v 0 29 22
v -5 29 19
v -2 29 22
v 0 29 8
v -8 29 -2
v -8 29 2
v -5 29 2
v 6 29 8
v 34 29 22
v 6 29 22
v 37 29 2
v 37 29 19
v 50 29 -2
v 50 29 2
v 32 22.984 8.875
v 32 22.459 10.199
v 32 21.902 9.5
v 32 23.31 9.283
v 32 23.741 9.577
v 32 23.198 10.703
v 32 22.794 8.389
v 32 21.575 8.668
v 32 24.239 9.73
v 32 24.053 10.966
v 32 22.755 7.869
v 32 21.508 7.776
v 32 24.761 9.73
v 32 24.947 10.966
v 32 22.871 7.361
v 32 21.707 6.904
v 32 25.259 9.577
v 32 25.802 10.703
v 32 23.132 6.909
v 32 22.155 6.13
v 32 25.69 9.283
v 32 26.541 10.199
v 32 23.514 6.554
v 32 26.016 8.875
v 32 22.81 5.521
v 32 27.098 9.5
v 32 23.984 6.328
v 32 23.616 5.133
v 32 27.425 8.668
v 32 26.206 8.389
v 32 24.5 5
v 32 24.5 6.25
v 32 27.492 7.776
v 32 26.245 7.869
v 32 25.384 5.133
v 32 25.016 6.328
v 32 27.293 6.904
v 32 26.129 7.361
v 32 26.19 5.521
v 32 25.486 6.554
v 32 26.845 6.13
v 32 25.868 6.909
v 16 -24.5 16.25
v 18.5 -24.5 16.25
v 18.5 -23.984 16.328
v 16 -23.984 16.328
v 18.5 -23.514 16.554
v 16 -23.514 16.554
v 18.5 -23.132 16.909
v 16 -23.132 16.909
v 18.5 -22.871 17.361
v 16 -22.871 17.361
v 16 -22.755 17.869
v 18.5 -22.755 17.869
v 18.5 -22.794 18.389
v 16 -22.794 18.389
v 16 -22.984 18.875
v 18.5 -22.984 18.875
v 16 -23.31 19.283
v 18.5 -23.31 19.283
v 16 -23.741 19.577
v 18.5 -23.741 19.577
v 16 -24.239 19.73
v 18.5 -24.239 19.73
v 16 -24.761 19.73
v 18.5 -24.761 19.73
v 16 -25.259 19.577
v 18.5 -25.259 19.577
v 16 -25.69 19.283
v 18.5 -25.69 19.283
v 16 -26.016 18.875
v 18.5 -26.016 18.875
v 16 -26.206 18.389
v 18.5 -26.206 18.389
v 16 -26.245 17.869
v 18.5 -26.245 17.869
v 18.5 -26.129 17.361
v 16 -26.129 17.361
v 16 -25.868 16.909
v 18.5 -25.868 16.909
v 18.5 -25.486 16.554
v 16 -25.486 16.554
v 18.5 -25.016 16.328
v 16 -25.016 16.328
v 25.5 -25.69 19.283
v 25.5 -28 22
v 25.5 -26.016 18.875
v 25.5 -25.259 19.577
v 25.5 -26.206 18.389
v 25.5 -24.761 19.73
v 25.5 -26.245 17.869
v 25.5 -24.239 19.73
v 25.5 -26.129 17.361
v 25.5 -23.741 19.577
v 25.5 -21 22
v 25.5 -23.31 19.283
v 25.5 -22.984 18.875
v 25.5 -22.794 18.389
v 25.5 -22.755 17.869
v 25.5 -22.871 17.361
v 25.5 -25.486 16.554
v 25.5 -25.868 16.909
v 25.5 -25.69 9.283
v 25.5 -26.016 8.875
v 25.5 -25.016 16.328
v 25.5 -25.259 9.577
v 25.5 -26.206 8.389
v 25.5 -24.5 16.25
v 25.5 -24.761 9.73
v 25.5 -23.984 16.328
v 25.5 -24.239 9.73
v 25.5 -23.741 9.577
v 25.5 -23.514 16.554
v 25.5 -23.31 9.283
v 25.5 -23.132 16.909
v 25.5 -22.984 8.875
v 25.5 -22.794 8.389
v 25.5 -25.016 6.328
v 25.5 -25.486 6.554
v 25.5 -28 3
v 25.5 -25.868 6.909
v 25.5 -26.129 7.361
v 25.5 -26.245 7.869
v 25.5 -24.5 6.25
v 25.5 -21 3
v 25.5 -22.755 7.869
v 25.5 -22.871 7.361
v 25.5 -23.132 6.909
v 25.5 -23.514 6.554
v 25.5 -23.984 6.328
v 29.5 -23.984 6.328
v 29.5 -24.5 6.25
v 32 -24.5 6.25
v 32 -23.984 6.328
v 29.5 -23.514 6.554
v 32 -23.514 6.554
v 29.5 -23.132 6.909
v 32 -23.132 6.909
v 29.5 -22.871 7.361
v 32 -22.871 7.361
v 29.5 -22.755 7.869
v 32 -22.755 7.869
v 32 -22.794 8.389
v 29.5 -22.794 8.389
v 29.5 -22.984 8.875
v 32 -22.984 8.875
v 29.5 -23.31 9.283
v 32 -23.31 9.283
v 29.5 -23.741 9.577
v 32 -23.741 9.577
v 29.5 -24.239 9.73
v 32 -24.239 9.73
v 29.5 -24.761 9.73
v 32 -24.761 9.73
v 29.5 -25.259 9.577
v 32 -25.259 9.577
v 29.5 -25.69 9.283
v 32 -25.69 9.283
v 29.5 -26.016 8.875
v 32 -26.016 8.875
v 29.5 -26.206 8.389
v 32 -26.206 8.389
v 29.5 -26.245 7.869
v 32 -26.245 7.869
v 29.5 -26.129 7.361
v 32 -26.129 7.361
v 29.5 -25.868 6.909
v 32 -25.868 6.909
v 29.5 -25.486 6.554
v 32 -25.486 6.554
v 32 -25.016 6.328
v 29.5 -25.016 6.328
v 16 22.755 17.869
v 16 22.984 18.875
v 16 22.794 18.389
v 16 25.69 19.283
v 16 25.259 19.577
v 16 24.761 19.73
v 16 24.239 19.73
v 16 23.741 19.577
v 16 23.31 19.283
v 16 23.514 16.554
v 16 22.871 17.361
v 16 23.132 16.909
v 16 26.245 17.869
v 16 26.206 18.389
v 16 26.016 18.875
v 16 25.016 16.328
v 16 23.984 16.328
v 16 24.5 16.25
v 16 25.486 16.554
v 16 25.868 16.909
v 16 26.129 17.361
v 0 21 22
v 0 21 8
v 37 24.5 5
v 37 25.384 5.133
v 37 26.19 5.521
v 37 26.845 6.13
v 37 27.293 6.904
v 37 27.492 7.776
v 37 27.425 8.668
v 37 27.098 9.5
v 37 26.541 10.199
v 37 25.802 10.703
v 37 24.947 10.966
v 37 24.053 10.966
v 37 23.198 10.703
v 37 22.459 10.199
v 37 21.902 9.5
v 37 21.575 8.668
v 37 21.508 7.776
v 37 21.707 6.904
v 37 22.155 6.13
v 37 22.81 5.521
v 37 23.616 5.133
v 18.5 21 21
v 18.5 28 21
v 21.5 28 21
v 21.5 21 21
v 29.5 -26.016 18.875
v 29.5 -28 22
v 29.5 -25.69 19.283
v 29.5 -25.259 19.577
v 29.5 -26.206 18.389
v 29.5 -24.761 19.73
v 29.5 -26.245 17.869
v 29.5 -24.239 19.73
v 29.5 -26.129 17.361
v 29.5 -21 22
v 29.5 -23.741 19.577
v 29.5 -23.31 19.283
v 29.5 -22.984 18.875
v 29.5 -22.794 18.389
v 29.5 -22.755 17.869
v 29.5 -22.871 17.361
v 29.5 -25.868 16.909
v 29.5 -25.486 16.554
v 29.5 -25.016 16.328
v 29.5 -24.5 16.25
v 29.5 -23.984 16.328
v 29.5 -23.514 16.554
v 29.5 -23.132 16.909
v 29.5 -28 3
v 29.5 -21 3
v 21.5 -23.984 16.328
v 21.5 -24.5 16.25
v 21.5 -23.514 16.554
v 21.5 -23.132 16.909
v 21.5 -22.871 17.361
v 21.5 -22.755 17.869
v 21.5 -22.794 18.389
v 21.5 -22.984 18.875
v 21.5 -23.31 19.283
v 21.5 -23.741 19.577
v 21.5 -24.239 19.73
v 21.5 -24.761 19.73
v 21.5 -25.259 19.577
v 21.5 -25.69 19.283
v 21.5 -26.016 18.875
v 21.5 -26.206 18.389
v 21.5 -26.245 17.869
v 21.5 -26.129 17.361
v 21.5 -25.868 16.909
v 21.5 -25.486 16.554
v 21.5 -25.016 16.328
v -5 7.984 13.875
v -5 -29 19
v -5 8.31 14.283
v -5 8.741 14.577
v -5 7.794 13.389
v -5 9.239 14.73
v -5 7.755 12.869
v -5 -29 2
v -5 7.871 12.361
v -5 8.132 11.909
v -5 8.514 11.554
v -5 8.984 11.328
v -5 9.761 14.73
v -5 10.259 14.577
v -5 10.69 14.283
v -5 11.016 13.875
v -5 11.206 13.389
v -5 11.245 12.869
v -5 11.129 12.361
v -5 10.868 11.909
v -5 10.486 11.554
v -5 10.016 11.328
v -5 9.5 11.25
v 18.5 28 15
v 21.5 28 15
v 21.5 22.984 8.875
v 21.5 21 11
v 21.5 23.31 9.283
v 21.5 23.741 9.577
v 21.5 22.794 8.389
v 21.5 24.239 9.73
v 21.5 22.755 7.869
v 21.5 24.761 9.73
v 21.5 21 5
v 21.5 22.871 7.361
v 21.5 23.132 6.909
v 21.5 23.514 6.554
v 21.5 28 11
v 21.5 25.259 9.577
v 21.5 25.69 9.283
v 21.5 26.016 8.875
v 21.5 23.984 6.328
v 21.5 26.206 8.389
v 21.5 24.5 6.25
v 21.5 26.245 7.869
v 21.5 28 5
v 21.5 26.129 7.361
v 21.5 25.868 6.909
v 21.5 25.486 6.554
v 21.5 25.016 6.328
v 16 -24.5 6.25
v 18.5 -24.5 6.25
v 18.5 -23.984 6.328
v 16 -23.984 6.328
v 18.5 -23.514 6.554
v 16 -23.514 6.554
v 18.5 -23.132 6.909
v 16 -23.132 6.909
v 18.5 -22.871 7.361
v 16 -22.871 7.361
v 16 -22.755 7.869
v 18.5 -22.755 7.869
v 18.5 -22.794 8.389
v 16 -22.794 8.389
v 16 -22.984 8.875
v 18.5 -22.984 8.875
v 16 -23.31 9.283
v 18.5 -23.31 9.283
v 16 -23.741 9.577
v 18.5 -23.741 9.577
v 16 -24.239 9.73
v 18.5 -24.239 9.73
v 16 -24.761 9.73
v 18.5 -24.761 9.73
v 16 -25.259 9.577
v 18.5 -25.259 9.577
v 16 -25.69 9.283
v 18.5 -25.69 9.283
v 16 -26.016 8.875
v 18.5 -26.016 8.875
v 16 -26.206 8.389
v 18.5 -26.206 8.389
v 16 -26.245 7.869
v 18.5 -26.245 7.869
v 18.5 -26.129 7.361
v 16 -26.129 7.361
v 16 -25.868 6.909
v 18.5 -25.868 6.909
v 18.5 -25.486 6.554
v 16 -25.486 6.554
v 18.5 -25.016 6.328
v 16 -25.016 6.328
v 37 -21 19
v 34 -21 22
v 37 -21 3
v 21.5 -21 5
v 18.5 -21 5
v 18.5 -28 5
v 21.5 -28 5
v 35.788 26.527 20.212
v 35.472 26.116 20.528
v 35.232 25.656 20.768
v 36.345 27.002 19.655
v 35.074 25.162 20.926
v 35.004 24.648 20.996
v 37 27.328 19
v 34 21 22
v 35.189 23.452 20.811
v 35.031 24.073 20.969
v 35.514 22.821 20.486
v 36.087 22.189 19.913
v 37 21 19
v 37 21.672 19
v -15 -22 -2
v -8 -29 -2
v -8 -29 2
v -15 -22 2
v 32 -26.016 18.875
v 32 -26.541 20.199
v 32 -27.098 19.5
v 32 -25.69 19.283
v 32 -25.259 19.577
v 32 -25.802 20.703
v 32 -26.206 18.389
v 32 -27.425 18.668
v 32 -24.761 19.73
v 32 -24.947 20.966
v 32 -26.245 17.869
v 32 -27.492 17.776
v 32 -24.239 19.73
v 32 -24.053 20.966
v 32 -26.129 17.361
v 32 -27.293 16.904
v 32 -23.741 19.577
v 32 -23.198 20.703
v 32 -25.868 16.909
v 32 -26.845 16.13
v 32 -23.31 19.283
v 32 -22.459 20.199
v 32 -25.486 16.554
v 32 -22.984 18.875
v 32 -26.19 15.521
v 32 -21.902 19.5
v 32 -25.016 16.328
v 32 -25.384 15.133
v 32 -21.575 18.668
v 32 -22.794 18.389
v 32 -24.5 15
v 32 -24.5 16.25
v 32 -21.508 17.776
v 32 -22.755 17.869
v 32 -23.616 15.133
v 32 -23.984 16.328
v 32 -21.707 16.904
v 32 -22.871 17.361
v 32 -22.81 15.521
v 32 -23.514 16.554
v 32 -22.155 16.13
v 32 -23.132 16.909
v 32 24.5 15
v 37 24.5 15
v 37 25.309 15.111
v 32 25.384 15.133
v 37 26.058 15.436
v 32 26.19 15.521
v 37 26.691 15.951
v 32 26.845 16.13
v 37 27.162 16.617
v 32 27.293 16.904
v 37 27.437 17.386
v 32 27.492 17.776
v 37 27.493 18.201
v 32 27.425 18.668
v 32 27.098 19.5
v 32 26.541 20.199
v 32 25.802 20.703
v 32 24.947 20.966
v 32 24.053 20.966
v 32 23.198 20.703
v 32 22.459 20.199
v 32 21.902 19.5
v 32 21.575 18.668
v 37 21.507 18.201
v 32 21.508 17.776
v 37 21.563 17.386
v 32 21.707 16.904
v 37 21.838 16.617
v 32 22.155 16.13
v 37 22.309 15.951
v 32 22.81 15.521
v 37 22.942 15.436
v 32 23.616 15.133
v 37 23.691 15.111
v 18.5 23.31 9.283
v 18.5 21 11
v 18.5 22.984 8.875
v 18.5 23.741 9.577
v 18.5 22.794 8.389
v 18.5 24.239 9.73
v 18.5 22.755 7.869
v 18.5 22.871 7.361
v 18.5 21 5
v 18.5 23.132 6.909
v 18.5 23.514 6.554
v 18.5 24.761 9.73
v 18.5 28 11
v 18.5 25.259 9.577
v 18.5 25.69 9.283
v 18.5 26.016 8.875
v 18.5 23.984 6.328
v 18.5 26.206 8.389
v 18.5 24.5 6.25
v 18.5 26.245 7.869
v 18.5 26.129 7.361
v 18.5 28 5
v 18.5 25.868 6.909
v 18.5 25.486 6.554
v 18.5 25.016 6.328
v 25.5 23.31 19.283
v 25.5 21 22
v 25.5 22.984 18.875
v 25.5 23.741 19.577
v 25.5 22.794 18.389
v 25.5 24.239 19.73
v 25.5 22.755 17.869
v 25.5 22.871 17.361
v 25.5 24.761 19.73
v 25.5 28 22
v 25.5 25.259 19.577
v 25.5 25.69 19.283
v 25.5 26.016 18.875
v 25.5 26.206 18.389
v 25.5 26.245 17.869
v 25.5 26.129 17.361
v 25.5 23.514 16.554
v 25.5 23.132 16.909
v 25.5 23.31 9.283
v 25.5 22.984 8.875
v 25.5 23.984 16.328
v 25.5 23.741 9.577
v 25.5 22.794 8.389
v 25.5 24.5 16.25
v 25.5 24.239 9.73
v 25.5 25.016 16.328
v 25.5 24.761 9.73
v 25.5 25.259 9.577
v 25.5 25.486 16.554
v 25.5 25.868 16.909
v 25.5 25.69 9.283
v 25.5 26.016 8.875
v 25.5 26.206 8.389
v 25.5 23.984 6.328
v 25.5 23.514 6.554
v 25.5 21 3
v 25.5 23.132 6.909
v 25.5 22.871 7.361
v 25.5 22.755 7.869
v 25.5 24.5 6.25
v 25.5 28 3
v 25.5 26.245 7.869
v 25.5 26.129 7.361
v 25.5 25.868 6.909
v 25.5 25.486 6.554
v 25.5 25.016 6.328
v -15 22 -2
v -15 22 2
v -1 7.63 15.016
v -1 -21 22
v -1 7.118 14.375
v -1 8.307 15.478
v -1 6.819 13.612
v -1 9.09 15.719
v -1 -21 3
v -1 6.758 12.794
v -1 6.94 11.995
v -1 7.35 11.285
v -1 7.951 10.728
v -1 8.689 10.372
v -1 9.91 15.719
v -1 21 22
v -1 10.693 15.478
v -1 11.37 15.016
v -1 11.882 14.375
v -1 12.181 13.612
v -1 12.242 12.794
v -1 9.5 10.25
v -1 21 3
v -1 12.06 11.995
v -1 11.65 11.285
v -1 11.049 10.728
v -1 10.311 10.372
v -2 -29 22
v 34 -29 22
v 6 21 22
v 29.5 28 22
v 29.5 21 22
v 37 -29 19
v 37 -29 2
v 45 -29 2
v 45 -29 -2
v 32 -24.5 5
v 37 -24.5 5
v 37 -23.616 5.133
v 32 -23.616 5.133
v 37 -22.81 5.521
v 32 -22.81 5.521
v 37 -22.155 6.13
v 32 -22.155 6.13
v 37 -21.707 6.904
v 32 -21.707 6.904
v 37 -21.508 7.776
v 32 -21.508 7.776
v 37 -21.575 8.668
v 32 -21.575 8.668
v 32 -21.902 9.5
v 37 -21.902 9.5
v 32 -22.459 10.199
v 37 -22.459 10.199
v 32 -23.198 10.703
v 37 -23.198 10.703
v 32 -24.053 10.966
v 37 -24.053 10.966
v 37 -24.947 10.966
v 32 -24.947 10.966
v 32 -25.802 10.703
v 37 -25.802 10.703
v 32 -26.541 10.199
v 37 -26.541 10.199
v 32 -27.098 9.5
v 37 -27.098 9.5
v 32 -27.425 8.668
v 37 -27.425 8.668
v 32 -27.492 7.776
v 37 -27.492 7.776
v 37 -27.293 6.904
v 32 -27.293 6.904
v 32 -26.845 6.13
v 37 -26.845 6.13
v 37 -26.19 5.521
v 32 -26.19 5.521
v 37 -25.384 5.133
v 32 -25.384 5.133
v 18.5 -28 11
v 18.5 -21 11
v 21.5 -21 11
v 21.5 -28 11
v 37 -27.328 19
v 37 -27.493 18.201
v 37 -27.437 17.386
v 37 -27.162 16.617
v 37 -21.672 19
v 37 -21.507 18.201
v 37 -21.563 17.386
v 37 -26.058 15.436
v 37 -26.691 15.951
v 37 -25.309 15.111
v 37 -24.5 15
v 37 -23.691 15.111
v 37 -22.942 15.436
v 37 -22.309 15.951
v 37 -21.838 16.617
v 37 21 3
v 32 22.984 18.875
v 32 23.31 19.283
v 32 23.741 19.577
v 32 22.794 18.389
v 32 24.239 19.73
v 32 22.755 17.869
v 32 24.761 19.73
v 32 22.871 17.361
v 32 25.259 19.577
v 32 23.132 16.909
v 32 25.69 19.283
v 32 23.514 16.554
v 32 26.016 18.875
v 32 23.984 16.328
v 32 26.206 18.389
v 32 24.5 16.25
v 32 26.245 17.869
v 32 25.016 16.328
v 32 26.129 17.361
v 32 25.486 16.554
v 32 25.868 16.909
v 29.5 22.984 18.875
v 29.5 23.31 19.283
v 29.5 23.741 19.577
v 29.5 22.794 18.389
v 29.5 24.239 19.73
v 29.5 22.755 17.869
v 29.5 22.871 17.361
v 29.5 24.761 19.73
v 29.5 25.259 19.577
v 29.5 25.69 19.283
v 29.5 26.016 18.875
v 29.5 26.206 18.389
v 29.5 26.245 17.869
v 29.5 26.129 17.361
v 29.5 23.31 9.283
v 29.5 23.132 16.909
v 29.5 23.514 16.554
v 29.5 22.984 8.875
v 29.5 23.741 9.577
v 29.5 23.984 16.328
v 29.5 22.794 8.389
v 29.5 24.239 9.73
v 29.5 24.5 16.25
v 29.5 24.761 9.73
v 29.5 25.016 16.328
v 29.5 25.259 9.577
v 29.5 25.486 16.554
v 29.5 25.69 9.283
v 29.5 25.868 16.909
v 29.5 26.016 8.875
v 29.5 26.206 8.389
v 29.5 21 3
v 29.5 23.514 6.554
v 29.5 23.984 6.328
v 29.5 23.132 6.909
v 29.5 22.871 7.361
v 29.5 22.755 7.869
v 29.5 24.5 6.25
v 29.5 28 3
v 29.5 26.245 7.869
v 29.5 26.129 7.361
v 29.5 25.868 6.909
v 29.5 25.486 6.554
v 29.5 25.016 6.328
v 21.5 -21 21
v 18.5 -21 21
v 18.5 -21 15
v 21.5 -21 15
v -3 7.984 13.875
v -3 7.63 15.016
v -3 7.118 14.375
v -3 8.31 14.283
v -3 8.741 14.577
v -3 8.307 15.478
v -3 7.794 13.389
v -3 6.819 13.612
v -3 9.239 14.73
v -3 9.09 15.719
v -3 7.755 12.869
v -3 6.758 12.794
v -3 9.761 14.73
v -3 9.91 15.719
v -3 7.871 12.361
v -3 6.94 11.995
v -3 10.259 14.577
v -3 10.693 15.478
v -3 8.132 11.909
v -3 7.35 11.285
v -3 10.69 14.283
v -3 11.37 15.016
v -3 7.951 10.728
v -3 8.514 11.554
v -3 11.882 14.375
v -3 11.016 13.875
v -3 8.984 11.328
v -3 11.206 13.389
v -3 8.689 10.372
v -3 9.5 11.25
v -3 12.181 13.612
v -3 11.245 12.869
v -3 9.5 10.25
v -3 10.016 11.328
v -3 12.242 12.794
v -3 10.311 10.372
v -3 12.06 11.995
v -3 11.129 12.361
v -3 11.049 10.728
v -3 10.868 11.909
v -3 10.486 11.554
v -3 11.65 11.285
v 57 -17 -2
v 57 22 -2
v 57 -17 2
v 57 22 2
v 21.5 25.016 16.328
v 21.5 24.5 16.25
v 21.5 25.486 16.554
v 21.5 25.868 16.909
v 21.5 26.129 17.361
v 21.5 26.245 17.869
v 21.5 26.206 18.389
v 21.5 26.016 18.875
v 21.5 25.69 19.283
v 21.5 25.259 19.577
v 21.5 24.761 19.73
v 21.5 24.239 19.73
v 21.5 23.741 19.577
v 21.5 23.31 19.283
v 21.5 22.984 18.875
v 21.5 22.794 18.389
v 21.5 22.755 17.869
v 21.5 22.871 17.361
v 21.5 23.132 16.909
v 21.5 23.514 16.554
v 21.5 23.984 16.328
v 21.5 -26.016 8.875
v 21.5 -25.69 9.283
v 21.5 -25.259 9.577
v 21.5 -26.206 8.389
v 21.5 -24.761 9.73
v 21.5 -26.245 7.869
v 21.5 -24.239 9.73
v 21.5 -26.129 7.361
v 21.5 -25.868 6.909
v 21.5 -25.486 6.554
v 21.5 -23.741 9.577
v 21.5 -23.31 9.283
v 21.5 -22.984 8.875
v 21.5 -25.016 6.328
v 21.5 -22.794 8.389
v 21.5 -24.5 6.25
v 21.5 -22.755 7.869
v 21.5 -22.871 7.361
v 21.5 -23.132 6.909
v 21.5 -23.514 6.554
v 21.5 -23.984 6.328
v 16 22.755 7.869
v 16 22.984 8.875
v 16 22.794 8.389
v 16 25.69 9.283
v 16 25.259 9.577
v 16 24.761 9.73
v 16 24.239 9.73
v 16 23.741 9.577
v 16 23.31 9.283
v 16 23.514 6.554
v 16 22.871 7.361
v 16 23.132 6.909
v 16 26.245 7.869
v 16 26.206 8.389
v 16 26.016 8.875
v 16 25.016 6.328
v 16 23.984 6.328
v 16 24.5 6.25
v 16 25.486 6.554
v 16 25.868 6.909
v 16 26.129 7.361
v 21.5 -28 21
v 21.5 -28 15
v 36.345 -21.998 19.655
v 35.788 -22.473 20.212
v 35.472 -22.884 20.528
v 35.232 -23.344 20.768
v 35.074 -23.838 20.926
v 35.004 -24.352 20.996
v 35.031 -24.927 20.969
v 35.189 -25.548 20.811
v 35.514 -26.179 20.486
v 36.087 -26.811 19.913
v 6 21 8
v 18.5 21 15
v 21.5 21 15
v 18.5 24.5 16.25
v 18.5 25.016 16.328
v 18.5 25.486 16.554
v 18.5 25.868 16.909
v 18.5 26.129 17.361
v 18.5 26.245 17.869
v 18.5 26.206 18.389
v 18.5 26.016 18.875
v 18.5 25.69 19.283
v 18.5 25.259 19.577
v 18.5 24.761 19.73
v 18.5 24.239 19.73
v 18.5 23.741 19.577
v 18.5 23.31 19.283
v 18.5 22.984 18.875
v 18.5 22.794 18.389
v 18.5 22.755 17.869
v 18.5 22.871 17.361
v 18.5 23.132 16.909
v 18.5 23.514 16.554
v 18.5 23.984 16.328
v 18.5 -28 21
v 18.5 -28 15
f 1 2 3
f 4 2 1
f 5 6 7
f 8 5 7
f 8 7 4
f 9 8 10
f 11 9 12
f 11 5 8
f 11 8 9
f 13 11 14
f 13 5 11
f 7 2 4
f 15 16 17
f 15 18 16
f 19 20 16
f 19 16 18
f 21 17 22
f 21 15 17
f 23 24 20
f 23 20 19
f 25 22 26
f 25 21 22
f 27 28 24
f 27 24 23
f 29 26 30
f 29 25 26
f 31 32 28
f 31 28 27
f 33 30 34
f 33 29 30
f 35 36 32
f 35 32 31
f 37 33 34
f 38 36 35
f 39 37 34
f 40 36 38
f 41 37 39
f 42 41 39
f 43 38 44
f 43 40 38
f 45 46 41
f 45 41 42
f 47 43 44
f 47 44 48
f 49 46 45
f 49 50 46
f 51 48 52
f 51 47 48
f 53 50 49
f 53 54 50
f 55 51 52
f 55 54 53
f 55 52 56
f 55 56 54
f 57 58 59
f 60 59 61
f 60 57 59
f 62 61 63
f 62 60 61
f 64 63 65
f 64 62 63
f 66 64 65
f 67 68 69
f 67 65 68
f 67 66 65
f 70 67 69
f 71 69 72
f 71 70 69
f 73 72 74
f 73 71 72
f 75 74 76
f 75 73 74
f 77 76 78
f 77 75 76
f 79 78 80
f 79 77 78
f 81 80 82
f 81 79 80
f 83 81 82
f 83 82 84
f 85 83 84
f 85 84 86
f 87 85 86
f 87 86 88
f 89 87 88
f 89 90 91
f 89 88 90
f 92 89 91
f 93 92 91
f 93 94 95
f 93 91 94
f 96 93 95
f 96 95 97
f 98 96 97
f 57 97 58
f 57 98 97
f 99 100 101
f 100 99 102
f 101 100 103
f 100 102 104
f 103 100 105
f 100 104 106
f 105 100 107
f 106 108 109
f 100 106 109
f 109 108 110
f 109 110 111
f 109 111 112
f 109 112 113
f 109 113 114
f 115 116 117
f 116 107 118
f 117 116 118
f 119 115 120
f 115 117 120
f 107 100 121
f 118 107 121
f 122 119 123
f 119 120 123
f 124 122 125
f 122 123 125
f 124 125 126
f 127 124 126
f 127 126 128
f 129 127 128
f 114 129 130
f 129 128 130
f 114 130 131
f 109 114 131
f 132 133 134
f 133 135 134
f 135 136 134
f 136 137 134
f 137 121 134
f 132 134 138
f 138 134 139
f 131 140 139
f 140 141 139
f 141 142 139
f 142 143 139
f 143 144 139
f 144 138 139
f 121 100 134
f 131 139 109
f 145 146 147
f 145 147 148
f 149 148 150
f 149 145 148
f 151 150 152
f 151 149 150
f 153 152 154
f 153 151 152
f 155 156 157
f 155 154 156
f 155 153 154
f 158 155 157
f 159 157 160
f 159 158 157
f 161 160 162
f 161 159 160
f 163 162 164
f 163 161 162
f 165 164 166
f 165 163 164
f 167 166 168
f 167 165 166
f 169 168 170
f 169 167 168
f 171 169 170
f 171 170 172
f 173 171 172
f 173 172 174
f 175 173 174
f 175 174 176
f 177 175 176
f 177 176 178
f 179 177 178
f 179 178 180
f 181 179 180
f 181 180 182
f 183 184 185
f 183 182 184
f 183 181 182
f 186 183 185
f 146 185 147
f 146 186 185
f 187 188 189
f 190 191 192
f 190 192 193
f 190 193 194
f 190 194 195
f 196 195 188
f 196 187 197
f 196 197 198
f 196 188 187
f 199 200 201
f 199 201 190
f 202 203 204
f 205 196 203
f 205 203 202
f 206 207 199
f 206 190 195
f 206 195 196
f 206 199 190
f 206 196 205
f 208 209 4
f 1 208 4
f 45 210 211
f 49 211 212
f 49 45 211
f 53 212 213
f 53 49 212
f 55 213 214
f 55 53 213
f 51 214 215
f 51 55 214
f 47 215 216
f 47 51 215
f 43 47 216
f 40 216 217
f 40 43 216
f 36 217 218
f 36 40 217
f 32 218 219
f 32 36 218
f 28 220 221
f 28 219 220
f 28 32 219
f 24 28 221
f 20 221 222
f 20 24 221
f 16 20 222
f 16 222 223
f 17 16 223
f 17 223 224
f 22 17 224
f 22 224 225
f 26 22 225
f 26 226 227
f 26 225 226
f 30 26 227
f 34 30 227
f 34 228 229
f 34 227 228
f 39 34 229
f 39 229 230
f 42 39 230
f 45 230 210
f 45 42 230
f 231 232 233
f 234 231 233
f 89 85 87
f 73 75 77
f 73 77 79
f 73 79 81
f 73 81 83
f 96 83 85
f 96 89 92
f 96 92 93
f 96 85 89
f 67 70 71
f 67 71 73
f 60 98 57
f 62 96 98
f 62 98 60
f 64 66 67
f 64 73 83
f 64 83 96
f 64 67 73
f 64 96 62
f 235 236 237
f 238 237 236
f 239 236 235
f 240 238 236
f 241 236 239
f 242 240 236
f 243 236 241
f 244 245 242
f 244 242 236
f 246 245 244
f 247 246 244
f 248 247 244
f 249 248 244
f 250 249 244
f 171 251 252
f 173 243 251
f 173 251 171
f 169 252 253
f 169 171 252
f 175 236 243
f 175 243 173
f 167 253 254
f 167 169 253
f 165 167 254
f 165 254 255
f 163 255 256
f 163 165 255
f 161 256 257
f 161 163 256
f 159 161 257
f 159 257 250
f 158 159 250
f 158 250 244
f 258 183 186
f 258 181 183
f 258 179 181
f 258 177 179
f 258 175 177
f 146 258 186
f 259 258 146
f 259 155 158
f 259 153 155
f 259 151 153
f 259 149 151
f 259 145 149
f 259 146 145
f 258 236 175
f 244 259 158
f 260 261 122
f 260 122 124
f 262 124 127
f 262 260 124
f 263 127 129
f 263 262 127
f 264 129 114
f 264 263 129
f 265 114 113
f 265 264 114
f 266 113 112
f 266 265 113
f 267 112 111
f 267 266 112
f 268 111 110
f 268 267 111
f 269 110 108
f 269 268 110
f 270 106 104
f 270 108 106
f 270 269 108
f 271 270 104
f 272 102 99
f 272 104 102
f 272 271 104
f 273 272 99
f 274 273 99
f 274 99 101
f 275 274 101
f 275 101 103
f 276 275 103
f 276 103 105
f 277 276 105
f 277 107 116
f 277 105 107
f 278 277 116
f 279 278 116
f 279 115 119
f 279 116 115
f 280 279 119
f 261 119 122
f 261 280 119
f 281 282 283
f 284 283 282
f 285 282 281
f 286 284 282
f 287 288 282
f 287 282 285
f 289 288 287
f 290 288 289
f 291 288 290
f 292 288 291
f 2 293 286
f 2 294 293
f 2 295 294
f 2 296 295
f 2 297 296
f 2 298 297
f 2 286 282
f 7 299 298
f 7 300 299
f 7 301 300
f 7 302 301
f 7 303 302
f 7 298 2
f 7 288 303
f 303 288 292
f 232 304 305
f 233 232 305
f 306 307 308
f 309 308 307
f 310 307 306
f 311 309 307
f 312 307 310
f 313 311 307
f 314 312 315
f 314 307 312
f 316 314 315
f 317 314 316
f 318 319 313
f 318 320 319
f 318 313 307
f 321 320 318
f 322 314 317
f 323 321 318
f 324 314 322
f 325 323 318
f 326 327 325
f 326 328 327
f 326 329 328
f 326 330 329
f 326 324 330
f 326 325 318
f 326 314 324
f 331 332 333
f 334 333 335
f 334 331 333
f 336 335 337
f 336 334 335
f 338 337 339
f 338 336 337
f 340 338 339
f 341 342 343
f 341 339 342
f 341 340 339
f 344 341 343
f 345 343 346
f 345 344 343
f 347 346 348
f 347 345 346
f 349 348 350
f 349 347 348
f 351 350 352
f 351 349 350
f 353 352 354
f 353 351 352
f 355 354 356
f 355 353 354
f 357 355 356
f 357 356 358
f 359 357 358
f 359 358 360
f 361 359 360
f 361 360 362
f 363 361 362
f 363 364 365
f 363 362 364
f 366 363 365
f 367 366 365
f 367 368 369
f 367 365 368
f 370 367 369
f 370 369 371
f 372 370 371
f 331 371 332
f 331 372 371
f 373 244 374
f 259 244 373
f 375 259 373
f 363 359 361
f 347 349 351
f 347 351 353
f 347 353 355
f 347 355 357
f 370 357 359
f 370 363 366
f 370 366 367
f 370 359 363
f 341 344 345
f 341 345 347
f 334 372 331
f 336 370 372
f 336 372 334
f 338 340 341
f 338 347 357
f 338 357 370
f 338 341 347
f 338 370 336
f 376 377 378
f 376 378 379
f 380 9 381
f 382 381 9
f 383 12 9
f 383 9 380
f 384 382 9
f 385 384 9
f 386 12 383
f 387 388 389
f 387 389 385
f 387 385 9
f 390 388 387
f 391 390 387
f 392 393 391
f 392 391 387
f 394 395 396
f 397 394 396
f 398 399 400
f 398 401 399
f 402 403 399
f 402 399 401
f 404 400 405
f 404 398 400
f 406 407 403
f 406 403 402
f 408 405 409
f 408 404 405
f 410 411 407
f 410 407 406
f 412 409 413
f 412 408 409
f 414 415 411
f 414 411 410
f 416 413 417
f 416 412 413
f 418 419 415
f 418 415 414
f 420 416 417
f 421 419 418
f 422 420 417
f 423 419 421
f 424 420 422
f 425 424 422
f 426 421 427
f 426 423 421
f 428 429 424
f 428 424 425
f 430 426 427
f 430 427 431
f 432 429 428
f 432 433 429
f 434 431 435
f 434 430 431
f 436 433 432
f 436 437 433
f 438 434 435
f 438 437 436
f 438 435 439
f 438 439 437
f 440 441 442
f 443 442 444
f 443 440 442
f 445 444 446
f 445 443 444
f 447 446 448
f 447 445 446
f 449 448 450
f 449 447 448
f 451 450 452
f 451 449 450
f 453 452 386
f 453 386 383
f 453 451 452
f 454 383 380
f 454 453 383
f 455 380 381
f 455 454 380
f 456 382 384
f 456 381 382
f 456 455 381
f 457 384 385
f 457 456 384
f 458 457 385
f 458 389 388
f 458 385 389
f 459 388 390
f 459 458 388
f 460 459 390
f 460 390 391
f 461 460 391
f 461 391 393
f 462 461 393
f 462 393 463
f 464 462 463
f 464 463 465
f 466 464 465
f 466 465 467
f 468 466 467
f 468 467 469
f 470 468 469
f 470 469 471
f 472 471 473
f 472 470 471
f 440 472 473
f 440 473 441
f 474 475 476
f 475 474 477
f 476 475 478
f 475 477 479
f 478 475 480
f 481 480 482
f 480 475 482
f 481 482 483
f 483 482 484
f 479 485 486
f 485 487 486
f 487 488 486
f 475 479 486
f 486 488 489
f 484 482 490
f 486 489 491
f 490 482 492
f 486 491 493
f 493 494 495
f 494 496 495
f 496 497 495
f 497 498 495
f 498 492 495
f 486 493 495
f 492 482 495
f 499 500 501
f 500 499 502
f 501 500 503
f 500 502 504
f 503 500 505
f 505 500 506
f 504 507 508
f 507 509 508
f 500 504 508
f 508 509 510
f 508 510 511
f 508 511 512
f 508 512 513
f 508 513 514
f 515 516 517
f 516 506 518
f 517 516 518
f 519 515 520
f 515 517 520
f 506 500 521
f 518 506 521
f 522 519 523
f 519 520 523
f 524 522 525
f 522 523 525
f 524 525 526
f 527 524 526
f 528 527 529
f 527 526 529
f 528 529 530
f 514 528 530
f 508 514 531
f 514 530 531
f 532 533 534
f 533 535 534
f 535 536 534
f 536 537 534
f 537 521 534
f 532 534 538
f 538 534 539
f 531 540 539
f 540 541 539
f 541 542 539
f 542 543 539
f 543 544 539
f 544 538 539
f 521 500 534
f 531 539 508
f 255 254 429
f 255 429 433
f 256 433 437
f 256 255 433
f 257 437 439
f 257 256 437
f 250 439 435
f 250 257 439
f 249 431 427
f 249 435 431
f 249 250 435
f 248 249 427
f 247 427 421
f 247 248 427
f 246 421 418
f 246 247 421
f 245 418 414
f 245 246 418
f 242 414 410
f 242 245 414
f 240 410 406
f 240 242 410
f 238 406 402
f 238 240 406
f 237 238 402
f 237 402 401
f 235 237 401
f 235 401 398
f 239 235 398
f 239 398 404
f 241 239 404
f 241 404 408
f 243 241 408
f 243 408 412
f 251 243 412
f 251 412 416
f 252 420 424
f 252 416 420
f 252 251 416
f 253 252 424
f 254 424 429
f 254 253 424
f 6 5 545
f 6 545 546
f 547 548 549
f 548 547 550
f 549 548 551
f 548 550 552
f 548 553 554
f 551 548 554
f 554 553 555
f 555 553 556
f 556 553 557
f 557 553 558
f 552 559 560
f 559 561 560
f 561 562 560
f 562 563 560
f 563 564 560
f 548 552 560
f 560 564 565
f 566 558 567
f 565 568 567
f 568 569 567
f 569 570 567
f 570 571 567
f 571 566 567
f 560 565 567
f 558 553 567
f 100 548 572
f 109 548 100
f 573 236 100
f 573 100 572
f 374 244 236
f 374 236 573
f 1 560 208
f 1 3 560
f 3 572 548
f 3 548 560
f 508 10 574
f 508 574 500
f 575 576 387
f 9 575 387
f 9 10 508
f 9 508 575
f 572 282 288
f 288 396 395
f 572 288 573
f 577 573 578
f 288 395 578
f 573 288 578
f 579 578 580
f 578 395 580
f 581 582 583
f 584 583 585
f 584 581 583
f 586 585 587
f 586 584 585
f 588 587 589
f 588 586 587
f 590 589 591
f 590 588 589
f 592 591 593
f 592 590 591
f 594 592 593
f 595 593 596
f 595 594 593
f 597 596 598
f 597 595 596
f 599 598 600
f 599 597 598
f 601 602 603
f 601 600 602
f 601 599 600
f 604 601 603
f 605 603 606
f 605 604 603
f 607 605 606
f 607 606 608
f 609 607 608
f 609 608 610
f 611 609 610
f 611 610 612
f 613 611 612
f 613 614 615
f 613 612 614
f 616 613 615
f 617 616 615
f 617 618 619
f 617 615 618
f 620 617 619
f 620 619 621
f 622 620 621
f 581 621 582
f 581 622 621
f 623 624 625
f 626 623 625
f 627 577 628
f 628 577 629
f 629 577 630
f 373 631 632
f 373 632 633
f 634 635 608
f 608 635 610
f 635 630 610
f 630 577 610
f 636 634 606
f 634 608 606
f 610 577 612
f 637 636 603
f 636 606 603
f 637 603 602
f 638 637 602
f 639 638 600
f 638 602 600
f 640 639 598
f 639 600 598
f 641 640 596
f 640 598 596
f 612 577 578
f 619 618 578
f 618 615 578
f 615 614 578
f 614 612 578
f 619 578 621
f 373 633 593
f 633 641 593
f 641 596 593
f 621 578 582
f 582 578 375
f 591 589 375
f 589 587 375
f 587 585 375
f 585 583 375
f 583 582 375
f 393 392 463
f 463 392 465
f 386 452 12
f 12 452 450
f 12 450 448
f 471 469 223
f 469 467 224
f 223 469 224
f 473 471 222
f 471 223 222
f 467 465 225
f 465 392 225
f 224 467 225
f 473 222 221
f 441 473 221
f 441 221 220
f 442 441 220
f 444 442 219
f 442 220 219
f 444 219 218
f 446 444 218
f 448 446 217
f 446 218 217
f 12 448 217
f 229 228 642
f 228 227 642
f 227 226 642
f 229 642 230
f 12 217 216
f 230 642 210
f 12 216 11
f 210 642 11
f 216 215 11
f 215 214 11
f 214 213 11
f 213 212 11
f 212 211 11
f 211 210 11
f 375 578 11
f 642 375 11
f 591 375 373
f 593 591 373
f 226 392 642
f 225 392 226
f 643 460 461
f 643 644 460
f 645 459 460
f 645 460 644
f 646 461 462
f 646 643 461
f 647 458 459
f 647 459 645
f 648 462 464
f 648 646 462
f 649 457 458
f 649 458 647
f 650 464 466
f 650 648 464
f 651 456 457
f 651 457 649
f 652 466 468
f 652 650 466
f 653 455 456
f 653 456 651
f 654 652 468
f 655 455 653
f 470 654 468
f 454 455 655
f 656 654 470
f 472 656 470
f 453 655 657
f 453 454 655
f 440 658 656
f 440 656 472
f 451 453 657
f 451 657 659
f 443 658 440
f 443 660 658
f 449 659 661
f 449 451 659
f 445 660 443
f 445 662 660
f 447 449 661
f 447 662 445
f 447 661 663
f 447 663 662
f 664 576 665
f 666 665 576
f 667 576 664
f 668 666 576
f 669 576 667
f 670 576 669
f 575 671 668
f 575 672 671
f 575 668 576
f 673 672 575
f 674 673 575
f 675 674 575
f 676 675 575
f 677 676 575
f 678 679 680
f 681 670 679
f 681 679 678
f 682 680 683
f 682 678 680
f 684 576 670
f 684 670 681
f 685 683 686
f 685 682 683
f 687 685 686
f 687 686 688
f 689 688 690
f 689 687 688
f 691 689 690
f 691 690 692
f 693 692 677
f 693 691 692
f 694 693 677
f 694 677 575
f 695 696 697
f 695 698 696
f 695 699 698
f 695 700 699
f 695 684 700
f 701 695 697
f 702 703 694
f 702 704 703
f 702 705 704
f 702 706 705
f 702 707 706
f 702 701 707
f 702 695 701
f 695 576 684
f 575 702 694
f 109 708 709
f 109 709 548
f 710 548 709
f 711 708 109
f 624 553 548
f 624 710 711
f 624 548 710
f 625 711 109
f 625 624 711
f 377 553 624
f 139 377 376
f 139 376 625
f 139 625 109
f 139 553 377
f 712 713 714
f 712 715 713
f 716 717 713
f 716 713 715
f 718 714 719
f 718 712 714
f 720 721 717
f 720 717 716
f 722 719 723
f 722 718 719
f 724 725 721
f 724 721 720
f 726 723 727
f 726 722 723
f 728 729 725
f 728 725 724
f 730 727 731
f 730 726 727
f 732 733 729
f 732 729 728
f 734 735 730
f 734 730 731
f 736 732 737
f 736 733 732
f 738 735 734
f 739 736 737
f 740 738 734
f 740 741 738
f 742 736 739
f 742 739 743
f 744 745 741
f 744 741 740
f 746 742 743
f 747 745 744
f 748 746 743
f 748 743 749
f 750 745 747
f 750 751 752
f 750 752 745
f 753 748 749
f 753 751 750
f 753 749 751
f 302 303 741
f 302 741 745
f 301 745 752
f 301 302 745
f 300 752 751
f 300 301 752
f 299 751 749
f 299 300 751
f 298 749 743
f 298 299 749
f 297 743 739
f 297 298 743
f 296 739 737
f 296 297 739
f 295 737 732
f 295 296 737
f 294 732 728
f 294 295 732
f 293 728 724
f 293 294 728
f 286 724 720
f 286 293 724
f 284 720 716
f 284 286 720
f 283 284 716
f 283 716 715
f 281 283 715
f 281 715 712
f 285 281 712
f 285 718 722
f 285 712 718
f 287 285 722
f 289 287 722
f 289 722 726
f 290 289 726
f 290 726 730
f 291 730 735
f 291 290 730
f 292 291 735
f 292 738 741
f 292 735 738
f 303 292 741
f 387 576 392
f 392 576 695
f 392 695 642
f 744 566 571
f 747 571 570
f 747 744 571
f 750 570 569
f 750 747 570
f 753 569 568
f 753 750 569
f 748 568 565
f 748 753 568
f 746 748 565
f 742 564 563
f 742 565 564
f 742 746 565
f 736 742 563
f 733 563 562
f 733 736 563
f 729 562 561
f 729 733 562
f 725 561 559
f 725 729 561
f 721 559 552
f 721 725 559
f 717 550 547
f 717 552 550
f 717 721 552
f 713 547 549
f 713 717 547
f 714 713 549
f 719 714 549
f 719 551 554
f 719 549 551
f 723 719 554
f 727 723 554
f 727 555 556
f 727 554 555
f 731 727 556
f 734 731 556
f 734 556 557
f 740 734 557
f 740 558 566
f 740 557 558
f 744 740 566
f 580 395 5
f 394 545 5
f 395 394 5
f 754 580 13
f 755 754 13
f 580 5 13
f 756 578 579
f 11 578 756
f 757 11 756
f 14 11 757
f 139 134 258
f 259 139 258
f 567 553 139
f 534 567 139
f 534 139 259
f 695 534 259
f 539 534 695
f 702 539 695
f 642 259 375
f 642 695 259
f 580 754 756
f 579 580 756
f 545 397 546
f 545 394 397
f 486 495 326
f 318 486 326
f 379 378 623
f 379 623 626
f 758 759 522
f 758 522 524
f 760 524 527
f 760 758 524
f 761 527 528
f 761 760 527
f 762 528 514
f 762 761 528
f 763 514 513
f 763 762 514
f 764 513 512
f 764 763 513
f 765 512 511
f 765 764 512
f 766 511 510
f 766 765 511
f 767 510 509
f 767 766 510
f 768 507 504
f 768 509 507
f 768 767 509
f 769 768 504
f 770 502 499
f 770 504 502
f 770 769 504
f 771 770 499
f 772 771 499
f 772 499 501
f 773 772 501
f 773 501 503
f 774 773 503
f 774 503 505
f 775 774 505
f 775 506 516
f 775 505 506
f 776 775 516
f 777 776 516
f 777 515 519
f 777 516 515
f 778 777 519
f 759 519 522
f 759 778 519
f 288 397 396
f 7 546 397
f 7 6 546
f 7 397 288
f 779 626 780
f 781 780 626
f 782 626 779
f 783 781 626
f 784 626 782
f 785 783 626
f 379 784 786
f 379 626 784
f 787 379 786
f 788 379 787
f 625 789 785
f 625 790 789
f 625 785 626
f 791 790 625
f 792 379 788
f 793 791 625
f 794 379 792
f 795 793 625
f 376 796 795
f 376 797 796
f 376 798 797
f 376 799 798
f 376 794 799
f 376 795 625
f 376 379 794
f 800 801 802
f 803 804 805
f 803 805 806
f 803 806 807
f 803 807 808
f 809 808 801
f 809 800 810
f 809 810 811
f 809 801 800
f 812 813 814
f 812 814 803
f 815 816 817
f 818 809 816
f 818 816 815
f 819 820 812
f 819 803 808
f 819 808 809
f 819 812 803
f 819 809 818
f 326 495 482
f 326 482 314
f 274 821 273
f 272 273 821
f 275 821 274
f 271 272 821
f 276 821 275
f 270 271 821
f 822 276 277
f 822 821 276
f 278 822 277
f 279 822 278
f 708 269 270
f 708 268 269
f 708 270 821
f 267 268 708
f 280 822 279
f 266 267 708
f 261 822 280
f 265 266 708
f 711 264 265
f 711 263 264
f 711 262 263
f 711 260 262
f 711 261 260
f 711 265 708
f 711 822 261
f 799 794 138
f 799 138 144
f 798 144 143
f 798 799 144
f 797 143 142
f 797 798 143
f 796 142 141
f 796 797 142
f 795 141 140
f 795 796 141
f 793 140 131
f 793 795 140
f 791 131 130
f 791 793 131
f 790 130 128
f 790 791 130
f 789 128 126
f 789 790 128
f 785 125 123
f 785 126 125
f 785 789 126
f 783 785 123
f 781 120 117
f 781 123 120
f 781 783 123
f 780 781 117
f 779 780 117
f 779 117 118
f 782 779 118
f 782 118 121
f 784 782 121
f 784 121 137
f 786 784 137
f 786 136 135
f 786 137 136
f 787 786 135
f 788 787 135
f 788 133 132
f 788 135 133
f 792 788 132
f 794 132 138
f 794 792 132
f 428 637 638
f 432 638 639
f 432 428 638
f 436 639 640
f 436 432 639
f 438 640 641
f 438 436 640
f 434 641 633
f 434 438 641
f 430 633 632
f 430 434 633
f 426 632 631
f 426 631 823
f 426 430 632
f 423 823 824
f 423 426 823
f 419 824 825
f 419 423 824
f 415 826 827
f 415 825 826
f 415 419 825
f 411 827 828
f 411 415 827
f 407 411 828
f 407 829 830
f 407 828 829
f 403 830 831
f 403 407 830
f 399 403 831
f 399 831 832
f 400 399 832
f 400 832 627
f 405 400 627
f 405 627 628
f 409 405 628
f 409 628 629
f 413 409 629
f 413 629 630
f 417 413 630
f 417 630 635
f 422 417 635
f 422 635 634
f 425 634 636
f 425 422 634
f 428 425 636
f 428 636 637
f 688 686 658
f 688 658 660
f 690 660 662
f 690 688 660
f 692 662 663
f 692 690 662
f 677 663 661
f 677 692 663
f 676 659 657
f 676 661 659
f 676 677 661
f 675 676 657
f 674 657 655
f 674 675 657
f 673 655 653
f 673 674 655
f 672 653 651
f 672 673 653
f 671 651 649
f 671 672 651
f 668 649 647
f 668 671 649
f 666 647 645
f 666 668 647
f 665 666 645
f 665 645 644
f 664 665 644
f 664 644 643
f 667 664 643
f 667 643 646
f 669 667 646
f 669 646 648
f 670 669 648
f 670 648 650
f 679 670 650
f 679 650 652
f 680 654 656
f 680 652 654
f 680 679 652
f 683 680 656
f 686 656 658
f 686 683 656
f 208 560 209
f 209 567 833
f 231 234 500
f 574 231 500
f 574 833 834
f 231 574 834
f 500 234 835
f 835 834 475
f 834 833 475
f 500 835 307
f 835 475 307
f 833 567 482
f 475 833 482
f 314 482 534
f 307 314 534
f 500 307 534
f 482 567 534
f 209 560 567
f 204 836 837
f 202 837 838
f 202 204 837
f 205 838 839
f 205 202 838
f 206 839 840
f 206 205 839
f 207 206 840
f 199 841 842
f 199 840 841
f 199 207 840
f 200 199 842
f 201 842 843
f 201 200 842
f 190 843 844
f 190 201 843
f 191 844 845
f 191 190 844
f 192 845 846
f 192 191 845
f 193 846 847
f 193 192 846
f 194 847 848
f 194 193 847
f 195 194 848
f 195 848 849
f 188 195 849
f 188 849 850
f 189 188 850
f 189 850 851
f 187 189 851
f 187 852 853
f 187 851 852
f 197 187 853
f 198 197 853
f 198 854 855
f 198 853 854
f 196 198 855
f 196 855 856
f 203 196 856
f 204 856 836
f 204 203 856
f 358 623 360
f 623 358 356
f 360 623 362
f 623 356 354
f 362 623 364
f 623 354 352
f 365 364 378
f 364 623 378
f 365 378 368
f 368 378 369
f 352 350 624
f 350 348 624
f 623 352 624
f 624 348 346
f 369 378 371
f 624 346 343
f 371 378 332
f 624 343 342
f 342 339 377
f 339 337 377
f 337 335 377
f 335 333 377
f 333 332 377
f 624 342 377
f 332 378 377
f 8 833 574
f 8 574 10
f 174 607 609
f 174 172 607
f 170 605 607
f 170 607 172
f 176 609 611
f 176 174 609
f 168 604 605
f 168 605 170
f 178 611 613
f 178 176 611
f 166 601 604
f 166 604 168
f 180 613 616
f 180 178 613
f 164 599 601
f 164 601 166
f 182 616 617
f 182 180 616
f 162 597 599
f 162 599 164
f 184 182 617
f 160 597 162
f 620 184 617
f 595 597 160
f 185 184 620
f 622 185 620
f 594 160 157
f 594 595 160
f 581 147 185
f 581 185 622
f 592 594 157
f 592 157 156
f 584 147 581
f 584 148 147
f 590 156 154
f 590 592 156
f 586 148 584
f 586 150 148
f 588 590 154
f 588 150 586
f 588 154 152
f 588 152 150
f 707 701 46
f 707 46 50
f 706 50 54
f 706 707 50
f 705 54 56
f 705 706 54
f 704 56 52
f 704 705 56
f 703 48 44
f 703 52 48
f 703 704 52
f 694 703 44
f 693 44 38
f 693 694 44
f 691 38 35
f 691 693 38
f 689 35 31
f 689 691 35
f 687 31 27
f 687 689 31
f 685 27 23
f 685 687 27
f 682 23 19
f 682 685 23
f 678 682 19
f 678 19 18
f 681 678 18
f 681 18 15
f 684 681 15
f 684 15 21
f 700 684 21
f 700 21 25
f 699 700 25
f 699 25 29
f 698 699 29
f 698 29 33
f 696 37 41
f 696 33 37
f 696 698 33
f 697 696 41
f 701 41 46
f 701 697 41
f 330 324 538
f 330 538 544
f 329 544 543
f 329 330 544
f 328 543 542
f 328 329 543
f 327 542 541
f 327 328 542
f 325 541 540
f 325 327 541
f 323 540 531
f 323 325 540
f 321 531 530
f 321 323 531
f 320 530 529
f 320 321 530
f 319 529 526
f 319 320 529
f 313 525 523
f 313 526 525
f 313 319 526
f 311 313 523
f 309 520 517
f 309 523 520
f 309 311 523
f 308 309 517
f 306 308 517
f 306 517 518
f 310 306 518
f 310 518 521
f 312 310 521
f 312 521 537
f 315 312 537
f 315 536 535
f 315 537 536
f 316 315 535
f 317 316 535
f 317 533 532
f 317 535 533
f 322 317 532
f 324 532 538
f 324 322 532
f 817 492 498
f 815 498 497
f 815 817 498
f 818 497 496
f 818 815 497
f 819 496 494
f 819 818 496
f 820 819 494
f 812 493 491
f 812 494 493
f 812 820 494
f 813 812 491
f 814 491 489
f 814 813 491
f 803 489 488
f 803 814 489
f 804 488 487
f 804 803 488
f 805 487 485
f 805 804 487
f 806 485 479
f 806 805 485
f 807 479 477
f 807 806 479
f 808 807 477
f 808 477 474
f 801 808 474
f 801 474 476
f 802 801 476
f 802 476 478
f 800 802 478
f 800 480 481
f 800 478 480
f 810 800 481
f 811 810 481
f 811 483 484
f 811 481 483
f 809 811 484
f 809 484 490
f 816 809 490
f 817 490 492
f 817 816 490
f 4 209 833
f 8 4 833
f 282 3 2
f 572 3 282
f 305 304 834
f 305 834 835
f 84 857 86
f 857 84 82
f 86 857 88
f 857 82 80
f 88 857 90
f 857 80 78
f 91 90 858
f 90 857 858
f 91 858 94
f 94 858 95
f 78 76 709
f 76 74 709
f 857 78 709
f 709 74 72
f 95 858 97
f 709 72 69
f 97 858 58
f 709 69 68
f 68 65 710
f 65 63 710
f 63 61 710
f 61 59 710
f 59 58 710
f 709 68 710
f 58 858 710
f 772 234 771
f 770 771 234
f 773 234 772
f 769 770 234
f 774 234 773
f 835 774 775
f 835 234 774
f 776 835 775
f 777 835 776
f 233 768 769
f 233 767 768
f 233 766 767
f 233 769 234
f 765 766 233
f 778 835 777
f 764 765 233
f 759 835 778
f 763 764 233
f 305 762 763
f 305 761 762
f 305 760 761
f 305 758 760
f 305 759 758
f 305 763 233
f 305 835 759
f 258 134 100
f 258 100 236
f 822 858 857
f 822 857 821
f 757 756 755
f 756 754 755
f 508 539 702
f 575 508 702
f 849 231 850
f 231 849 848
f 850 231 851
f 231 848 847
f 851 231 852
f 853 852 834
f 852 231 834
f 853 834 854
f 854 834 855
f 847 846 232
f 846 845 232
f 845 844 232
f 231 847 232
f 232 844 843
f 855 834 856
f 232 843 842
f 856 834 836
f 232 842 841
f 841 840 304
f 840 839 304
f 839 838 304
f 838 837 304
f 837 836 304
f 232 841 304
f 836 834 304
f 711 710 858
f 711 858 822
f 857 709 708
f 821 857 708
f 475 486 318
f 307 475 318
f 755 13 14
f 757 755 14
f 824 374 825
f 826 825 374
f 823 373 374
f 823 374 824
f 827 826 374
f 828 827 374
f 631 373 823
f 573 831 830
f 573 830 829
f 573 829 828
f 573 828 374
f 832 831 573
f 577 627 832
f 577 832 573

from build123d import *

# Parameters (mm, degrees)
BOX056_W                = 72
BOX056_H                = 58
BOX056_DEPTH            = 4
BOX024_W                = 6
BOX024_H                = 36
BOX024_DEPTH            = 23
CYLINDER011_R           = 2.75
CYLINDER011_DEPTH       = 74.5
CYLINDER011_PITCH_ANGLE = 90
CYLINDER008_R           = 1.75
CYLINDER008_DEPTH       = 21.5
CYLINDER008_PITCH_ANGLE = 90
CYLINDER009_R           = 3
CYLINDER009_DEPTH       = 21.5
CYLINDER009_PITCH_ANGLE = 90
BOX007_W                = 3
BOX007_H                = 56
BOX007_DEPTH            = 6
BOX008_W                = 3
BOX008_H                = 56
BOX008_DEPTH            = 6
BOX006_W                = 4
BOX006_H                = 56
BOX006_DEPTH            = 21
CYLINDER003_R           = 1.75
CYLINDER003_DEPTH       = 74.5
CYLINDER003_PITCH_ANGLE = 90
BOX003_W                = 28
BOX003_H                = 88
BOX003_DEPTH            = 38
BOX002_W                = 28
BOX002_H                = 88
BOX002_DEPTH            = 38
BOX001_W                = 47
BOX001_H                = 42
BOX001_DEPTH            = 25
BOX_W                   = 72
BOX_H                   = 58
BOX_DEPTH               = 24
FILLET_R                = 10
CHAMFER_SIZE            = 3
CHAMFER110_1_SIZE       = 12
CHAMFER110_2_SIZE       = 7


with BuildPart() as cubo006:
    # Box056 → Box056 (new body)
    with BuildSketch(Plane(origin=(-15, -29, -2), x_dir=(1, 0, 0), z_dir=(0, 0, 1))):
        with Locations((36, 29)):
            Rectangle(BOX056_W, BOX056_H)
    extrude(amount=BOX056_DEPTH)


with BuildPart() as cube024:
    # Box024 → Box024 (new body)
    with BuildSketch(Plane(origin=(0, 19, 7), x_dir=(1, 0, 0), z_dir=(0, 0, 1))):
        with Locations((3, 18)):
            Rectangle(BOX024_W, BOX024_H)
    extrude(amount=BOX024_DEPTH)


with BuildPart() as joint_d013:
    # Cylinder011 → Cylinder011 (new body)
    with BuildSketch(Plane.XY):
        Circle(CYLINDER011_R)
    extrude(amount=CYLINDER011_DEPTH)


with BuildPart() as joint_d013_1:
    # Cylinder011 pitch: moved
    add(joint_d013.part.rotate(Axis((0, 0, 0), (0, 1, 0)), CYLINDER011_PITCH_ANGLE))


with BuildPart() as joint_d013_2:
    # Cylinder011 placement: moved
    add(joint_d013_1.part.moved(Location((-3, 9.5, 12))))


with BuildPart() as joint_d010:
    # Cylinder008 → Cylinder008 (new body)
    with BuildSketch(Plane.XY):
        Circle(CYLINDER008_R)
    extrude(amount=CYLINDER008_DEPTH)


with BuildPart() as joint_d010_1:
    # Cylinder008 pitch: moved
    add(joint_d010.part.rotate(Axis((0, 0, 0), (0, 1, 0)), CYLINDER008_PITCH_ANGLE))


with BuildPart() as joint_d010_2:
    # Cylinder008 placement: moved
    add(joint_d010_1.part.moved(Location((16, -24.5, 7))))


with BuildPart() as joint_d011:
    # Cylinder009 → Cylinder009 (new body)
    with BuildSketch(Plane.XY):
        Circle(CYLINDER009_R)
    extrude(amount=CYLINDER009_DEPTH)


with BuildPart() as joint_d011_1:
    # Cylinder009 pitch: moved
    add(joint_d011.part.rotate(Axis((0, 0, 0), (0, 1, 0)), CYLINDER009_PITCH_ANGLE))


with BuildPart() as joint_d011_2:
    # Cylinder009 placement: moved
    add(joint_d011_1.part.moved(Location((32, -24.5, 7))))


with BuildPart() as fusion001:
    # Fusion001 base: copy of Joint-D011
    add(joint_d011_2.part)

    # Fusion001: union Joint-D010
    add(joint_d010_2.part)


with BuildPart() as fusion002:
    # Fusion002 base: copy of Joint-D011
    add(joint_d011_2.part)

    # Fusion002: union Joint-D010
    add(joint_d010_2.part)


with BuildPart() as fusion002_1:
    # Fusion002 placement: moved
    add(fusion002.part.moved(Location((0, 0, 10))))


with BuildPart() as fusion003:
    # Fusion003 base: copy of Joint-D011
    add(joint_d011_2.part)

    # Fusion003: union Joint-D010
    add(joint_d010_2.part)


with BuildPart() as fusion003_1:
    # Fusion003 placement: moved
    add(fusion003.part.moved(Location((0, 49, 0))))


with BuildPart() as fusion004:
    # Fusion004 base: copy of Joint-D011
    add(joint_d011_2.part)

    # Fusion004: union Joint-D010
    add(joint_d010_2.part)


with BuildPart() as fusion004_1:
    # Fusion004 placement: moved
    add(fusion004.part.moved(Location((0, 49, 10))))


with BuildPart() as cube007:
    # Box007 → Box007 (new body)
    with BuildSketch(Plane(origin=(18.5, -28, 4), x_dir=(1, 0, 0), z_dir=(0, 0, 1))):
        with Locations((1.5, 28)):
            Rectangle(BOX007_W, BOX007_H)
    extrude(amount=BOX007_DEPTH)


with BuildPart() as cube008:
    # Box008 → Box008 (new body)
    with BuildSketch(Plane(origin=(18.5, -28, 14), x_dir=(1, 0, 0), z_dir=(0, 0, 1))):
        with Locations((1.5, 28)):
            Rectangle(BOX008_W, BOX008_H)
    extrude(amount=BOX008_DEPTH)


with BuildPart() as cube006:
    # Box006 → Box006 (new body)
    with BuildSketch(Plane(origin=(25.5, -28, 2), x_dir=(1, 0, 0), z_dir=(0, 0, 1))):
        with Locations((2, 28)):
            Rectangle(BOX006_W, BOX006_H)
    extrude(amount=BOX006_DEPTH)


with BuildPart() as joint_d005:
    # Cylinder003 → Cylinder003 (new body)
    with BuildSketch(Plane.XY):
        Circle(CYLINDER003_R)
    extrude(amount=CYLINDER003_DEPTH)


with BuildPart() as joint_d005_1:
    # Cylinder003 pitch: moved
    add(joint_d005.part.rotate(Axis((0, 0, 0), (0, 1, 0)), CYLINDER003_PITCH_ANGLE))


with BuildPart() as joint_d005_2:
    # Cylinder003 placement: moved
    add(joint_d005_1.part.moved(Location((-22, 9.5, 12))))


with BuildPart() as cube003:
    # Box003 → Box003 (new body)
    with BuildSketch(Plane(origin=(-33, -45, 1), x_dir=(1, 0, 0), z_dir=(0, 0, 1))):
        with Locations((14, 44)):
            Rectangle(BOX003_W, BOX003_H)
    extrude(amount=BOX003_DEPTH)


with BuildPart() as cube002:
    # Box002 → Box002 (new body)
    with BuildSketch(Plane(origin=(37, -45, 1), x_dir=(1, 0, 0), z_dir=(0, 0, 1))):
        with Locations((14, 44)):
            Rectangle(BOX002_W, BOX002_H)
    extrude(amount=BOX002_DEPTH)


with BuildPart() as cube001:
    # Box001 → Box001 (new body)
    with BuildSketch(Plane(origin=(-1, -21, 2), x_dir=(1, 0, 0), z_dir=(0, 0, 1))):
        with Locations((23.5, 21)):
            Rectangle(BOX001_W, BOX001_H)
    extrude(amount=BOX001_DEPTH)


with BuildPart() as foot_src:
    # Box → Box (new body)
    with BuildSketch(Plane(origin=(-15, -29, -3), x_dir=(1, 0, 0), z_dir=(0, 0, 1))):
        with Locations((36, 29)):
            Rectangle(BOX_W, BOX_H)
    extrude(amount=BOX_DEPTH)

    # Cut: cut Cube001
    add(cube001.part, mode=Mode.SUBTRACT)

    # Cut001: cut Cube002
    add(cube002.part, mode=Mode.SUBTRACT)

    # Cut002: cut Cube003
    add(cube003.part, mode=Mode.SUBTRACT)

    # Fillet
    fillet_edges = [foot_src.edges().sort_by_distance(p)[0] for p in [
        (-15, -29, -1),
        (-15, 29, -1),
        (57, -29, -1),
        (57, 29, -1),
    ]]
    fillet(fillet_edges, radius=FILLET_R)

    # Chamfer
    chamfer_edges = [foot_src.edges().sort_by_distance(p)[0] for p in [
        (-5, 0, 21),
        (37, 25, 21),
        (37, -25, 21),
    ]]
    chamfer(chamfer_edges, length=CHAMFER_SIZE)

    # Cut008: cut Joint-D005
    add(joint_d005_2.part, mode=Mode.SUBTRACT)

    # Cut010: cut Cube006
    add(cube006.part, mode=Mode.SUBTRACT)

    # Cut011: cut Cube008
    add(cube008.part, mode=Mode.SUBTRACT)

    # Cut012: cut Cube007
    add(cube007.part, mode=Mode.SUBTRACT)

    # Cut013: cut Fusion004
    add(fusion004_1.part, mode=Mode.SUBTRACT)

    # Cut014: cut Fusion003
    add(fusion003_1.part, mode=Mode.SUBTRACT)

    # Cut015: cut Fusion002
    add(fusion002_1.part, mode=Mode.SUBTRACT)

    # Cut016: cut Fusion001
    add(fusion001.part, mode=Mode.SUBTRACT)

    # Cut017: cut Joint-D013
    add(joint_d013_2.part, mode=Mode.SUBTRACT)

    # Cut039: cut Cube024
    add(cube024.part, mode=Mode.SUBTRACT)


with BuildPart() as foot_src_1:
    # Cut039 placement: moved
    add(foot_src.part.moved(Location((0, 0, 1))))

    # Fusion060: union Cubo006
    add(cubo006.part)

    # Chamfer110 1
    chamfer110_1_edges = [foot_src_1.edges().sort_by_distance(p)[0] for p in [
        (57, -29, 0),
    ]]
    chamfer(chamfer110_1_edges, length=CHAMFER110_1_SIZE)

    # Chamfer110 2
    chamfer110_2_edges = [foot_src_1.edges().sort_by_distance(p)[0] for p in [
        (-15, -29, 0),
        (57, 29, 0),
        (-15, 29, 0),
    ]]
    chamfer(chamfer110_2_edges, length=CHAMFER110_2_SIZE)


solid = foot_src_1.part
